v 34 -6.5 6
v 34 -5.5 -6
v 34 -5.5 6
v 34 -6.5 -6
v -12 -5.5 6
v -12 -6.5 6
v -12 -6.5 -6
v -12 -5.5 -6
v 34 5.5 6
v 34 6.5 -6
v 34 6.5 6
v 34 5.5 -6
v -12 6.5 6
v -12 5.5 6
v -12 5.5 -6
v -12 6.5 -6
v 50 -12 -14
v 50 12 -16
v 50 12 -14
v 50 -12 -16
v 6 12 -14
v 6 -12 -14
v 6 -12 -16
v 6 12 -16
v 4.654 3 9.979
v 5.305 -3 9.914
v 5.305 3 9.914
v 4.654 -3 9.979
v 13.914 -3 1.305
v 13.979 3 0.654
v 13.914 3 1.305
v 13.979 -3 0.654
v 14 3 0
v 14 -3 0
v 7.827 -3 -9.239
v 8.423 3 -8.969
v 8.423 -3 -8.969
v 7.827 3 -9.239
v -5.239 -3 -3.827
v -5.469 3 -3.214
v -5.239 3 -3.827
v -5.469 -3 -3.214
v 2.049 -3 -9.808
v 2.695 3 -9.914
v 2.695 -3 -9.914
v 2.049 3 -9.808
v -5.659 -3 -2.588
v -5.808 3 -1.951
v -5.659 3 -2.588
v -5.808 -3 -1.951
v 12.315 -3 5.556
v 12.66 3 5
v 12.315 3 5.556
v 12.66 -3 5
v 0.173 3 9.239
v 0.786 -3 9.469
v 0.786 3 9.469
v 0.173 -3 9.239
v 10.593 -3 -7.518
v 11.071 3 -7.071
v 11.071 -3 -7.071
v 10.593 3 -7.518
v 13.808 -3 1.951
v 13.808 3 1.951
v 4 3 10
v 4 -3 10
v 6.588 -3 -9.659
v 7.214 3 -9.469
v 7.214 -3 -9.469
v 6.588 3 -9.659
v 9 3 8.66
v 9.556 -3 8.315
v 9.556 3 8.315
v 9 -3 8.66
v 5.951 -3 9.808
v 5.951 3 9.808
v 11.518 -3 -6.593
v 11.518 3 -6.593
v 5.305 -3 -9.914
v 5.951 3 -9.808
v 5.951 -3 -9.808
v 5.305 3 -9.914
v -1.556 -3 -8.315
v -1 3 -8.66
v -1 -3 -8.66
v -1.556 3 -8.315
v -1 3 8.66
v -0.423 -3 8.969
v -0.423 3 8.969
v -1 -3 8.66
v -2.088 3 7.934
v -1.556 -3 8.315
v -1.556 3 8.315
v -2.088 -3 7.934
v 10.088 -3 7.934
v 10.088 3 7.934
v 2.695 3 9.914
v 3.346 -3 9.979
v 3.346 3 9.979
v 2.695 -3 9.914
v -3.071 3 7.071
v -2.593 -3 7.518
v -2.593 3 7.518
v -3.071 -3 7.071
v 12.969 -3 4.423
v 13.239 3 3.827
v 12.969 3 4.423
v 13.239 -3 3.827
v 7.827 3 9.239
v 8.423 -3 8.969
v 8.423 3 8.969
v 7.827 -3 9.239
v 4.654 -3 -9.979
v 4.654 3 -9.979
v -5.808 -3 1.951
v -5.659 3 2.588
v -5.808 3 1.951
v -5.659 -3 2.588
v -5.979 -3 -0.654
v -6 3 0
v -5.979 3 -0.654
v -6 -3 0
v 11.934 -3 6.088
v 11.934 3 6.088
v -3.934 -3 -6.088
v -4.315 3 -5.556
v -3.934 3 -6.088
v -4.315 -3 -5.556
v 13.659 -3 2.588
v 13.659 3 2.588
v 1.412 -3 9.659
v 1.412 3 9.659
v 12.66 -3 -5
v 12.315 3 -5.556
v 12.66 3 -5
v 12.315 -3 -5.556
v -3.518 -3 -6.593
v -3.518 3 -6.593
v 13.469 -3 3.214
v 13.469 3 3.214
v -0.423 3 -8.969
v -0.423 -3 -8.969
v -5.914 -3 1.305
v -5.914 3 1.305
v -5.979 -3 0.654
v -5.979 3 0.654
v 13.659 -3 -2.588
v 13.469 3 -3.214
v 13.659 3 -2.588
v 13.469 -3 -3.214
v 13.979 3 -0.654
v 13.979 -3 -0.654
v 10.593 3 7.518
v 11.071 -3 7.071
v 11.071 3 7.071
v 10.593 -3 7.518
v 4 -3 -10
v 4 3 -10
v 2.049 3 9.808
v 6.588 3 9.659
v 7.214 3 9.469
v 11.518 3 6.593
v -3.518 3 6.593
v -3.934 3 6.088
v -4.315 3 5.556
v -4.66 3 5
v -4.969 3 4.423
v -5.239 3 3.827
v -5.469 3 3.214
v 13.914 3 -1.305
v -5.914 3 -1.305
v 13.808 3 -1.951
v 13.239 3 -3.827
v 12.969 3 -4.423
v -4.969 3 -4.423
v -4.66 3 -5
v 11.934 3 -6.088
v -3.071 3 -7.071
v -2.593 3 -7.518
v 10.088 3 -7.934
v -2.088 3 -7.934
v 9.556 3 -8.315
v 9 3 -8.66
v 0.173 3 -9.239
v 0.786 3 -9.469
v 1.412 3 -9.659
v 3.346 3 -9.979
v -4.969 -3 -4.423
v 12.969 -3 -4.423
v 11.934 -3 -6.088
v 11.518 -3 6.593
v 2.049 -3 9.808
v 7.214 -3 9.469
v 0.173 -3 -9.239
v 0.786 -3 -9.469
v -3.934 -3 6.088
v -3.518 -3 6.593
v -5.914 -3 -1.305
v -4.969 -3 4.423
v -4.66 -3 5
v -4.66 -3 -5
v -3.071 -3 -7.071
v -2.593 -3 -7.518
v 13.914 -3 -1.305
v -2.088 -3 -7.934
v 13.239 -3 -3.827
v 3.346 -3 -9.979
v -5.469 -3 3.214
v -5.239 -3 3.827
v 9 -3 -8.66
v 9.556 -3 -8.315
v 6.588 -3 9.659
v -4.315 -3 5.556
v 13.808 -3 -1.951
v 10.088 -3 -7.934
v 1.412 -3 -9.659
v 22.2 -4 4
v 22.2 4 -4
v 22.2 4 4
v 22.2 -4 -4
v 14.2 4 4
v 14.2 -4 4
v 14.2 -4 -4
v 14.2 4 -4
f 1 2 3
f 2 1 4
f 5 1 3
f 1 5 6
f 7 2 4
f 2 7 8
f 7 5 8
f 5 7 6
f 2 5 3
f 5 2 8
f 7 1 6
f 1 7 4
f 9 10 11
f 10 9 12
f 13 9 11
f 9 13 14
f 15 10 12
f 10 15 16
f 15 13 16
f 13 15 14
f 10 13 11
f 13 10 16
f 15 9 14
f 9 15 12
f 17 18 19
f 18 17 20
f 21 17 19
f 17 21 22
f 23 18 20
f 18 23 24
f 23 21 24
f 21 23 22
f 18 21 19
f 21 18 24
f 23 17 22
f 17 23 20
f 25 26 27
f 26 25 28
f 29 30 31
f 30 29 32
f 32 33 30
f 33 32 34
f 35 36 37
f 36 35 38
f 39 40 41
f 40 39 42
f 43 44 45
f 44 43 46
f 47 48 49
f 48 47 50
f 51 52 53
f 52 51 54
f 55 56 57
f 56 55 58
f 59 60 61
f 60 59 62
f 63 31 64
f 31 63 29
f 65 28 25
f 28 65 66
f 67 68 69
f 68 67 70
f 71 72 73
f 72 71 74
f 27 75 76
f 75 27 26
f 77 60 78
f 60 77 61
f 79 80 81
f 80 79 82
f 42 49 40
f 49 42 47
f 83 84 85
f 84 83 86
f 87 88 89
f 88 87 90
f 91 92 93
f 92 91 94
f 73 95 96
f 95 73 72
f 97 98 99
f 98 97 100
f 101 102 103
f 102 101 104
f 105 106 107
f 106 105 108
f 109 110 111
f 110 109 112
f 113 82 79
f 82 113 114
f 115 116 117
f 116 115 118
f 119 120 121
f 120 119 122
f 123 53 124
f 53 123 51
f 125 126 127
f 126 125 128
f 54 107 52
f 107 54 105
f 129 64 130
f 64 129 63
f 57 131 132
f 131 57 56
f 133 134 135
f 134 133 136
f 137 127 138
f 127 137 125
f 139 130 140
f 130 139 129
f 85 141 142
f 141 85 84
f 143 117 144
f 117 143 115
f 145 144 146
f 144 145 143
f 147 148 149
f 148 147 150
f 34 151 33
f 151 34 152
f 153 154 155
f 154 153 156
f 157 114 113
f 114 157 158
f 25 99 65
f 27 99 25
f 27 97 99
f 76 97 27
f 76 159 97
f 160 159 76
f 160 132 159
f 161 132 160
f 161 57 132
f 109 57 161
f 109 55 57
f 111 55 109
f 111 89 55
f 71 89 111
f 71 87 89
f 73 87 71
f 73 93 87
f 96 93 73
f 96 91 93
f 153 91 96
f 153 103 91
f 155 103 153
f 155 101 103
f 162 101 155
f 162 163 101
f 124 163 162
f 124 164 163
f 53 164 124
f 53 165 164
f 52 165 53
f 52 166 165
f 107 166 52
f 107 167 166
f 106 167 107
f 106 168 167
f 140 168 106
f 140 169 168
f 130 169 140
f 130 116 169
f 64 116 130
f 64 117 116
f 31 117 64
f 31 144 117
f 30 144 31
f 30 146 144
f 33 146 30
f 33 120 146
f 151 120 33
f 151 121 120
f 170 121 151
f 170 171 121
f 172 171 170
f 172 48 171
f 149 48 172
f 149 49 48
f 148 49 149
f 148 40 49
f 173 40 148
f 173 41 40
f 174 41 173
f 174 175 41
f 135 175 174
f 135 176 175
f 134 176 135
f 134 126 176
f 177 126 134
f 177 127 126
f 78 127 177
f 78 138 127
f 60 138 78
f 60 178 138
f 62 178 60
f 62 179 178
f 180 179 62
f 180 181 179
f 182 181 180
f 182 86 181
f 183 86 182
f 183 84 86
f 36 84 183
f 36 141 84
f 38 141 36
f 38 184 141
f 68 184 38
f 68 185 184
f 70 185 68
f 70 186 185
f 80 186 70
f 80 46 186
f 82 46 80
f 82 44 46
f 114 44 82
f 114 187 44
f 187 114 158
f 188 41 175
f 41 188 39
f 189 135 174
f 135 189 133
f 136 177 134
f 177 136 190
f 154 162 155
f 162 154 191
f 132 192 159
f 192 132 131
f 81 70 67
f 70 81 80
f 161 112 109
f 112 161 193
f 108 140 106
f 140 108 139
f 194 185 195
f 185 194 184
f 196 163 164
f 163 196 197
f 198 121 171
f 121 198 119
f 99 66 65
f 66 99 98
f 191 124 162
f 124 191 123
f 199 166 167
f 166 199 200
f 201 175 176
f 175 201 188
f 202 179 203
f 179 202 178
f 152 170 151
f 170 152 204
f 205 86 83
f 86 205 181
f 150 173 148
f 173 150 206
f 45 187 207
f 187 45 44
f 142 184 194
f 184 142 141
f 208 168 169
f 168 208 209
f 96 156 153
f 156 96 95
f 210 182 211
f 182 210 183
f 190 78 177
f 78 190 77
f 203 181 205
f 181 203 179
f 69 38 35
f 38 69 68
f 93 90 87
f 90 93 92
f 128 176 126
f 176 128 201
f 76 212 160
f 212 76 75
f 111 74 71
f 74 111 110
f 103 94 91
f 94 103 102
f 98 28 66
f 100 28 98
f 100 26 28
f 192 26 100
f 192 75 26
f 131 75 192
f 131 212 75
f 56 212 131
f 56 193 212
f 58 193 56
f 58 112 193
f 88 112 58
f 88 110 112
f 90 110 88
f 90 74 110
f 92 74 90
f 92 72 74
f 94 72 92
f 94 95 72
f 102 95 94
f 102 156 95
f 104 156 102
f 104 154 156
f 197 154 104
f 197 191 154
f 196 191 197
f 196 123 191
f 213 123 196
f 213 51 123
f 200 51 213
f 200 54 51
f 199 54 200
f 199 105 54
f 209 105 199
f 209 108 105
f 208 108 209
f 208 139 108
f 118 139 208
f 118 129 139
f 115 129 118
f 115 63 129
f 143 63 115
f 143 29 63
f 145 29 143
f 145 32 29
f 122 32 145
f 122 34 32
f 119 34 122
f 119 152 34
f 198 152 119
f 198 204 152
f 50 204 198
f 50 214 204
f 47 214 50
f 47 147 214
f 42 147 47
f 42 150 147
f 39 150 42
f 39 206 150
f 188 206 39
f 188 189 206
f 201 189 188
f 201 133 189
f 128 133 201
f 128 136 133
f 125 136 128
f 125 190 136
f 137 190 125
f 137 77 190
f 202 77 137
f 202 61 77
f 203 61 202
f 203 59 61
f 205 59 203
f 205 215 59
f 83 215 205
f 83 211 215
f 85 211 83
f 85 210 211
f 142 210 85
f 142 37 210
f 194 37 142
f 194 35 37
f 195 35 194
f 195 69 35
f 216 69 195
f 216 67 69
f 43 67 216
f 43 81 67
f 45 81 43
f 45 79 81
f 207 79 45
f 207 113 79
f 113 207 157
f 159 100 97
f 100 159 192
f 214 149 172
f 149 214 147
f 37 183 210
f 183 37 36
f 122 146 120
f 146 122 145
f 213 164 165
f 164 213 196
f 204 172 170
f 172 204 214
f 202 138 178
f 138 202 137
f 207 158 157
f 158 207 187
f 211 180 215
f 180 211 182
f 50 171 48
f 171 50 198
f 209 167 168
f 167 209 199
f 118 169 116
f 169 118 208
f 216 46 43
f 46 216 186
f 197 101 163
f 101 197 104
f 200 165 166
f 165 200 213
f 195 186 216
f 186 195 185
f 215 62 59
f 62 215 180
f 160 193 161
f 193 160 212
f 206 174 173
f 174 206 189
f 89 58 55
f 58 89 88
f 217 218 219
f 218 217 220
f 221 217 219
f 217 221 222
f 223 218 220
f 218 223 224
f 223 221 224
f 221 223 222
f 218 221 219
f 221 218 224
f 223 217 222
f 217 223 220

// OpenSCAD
// Eccentric disk cam with a flat translating follower.
// Two-dimensional mechanism in the XZ plane; the cam rotates about +Y.
// The follower face is perpendicular to +X and moves along X.
cam_angle = 0;
agentscad_part = "all";
eccentricity = 4;
cam_radius = 10;
cam_thickness = 6;
follower_gap = 0.2;
follower_length = 8;
follower_width = 8;
follower_height = 8;
$fn = 96;

module frame_local() {
  // Base plate below the mechanism.
  translate([6, -12, -16]) cube([44, 24, 2]);
  // Two guide rails around the follower; they do not touch the cam.
  for (yy = [-6.5, 5.5]) translate([-12, yy, -6]) cube([46, 1, 12]);
}

module cam_local() {
  // Eccentric disk in the XZ plane; the shaft is omitted so the frame needs no bearing.
  rotate([90, 0, 0]) translate([eccentricity, 0, 0]) cylinder(r = cam_radius, h = cam_thickness, center = true);
}

module follower_local() {
  // Flat face at x = R + e cos(theta) + gap; block extends to +X.
  xpos = cam_radius + eccentricity + follower_gap;
  translate([xpos, -follower_width / 2, -follower_height / 2])
    cube([follower_length, follower_width, follower_height]);
}

module assembly() {
  if (agentscad_part == "all" || agentscad_part == "frame") frame_local();
  if (agentscad_part == "all" || agentscad_part == "cam") cam_local();
  if (agentscad_part == "all" || agentscad_part == "follower") follower_local();
}

assembly();
